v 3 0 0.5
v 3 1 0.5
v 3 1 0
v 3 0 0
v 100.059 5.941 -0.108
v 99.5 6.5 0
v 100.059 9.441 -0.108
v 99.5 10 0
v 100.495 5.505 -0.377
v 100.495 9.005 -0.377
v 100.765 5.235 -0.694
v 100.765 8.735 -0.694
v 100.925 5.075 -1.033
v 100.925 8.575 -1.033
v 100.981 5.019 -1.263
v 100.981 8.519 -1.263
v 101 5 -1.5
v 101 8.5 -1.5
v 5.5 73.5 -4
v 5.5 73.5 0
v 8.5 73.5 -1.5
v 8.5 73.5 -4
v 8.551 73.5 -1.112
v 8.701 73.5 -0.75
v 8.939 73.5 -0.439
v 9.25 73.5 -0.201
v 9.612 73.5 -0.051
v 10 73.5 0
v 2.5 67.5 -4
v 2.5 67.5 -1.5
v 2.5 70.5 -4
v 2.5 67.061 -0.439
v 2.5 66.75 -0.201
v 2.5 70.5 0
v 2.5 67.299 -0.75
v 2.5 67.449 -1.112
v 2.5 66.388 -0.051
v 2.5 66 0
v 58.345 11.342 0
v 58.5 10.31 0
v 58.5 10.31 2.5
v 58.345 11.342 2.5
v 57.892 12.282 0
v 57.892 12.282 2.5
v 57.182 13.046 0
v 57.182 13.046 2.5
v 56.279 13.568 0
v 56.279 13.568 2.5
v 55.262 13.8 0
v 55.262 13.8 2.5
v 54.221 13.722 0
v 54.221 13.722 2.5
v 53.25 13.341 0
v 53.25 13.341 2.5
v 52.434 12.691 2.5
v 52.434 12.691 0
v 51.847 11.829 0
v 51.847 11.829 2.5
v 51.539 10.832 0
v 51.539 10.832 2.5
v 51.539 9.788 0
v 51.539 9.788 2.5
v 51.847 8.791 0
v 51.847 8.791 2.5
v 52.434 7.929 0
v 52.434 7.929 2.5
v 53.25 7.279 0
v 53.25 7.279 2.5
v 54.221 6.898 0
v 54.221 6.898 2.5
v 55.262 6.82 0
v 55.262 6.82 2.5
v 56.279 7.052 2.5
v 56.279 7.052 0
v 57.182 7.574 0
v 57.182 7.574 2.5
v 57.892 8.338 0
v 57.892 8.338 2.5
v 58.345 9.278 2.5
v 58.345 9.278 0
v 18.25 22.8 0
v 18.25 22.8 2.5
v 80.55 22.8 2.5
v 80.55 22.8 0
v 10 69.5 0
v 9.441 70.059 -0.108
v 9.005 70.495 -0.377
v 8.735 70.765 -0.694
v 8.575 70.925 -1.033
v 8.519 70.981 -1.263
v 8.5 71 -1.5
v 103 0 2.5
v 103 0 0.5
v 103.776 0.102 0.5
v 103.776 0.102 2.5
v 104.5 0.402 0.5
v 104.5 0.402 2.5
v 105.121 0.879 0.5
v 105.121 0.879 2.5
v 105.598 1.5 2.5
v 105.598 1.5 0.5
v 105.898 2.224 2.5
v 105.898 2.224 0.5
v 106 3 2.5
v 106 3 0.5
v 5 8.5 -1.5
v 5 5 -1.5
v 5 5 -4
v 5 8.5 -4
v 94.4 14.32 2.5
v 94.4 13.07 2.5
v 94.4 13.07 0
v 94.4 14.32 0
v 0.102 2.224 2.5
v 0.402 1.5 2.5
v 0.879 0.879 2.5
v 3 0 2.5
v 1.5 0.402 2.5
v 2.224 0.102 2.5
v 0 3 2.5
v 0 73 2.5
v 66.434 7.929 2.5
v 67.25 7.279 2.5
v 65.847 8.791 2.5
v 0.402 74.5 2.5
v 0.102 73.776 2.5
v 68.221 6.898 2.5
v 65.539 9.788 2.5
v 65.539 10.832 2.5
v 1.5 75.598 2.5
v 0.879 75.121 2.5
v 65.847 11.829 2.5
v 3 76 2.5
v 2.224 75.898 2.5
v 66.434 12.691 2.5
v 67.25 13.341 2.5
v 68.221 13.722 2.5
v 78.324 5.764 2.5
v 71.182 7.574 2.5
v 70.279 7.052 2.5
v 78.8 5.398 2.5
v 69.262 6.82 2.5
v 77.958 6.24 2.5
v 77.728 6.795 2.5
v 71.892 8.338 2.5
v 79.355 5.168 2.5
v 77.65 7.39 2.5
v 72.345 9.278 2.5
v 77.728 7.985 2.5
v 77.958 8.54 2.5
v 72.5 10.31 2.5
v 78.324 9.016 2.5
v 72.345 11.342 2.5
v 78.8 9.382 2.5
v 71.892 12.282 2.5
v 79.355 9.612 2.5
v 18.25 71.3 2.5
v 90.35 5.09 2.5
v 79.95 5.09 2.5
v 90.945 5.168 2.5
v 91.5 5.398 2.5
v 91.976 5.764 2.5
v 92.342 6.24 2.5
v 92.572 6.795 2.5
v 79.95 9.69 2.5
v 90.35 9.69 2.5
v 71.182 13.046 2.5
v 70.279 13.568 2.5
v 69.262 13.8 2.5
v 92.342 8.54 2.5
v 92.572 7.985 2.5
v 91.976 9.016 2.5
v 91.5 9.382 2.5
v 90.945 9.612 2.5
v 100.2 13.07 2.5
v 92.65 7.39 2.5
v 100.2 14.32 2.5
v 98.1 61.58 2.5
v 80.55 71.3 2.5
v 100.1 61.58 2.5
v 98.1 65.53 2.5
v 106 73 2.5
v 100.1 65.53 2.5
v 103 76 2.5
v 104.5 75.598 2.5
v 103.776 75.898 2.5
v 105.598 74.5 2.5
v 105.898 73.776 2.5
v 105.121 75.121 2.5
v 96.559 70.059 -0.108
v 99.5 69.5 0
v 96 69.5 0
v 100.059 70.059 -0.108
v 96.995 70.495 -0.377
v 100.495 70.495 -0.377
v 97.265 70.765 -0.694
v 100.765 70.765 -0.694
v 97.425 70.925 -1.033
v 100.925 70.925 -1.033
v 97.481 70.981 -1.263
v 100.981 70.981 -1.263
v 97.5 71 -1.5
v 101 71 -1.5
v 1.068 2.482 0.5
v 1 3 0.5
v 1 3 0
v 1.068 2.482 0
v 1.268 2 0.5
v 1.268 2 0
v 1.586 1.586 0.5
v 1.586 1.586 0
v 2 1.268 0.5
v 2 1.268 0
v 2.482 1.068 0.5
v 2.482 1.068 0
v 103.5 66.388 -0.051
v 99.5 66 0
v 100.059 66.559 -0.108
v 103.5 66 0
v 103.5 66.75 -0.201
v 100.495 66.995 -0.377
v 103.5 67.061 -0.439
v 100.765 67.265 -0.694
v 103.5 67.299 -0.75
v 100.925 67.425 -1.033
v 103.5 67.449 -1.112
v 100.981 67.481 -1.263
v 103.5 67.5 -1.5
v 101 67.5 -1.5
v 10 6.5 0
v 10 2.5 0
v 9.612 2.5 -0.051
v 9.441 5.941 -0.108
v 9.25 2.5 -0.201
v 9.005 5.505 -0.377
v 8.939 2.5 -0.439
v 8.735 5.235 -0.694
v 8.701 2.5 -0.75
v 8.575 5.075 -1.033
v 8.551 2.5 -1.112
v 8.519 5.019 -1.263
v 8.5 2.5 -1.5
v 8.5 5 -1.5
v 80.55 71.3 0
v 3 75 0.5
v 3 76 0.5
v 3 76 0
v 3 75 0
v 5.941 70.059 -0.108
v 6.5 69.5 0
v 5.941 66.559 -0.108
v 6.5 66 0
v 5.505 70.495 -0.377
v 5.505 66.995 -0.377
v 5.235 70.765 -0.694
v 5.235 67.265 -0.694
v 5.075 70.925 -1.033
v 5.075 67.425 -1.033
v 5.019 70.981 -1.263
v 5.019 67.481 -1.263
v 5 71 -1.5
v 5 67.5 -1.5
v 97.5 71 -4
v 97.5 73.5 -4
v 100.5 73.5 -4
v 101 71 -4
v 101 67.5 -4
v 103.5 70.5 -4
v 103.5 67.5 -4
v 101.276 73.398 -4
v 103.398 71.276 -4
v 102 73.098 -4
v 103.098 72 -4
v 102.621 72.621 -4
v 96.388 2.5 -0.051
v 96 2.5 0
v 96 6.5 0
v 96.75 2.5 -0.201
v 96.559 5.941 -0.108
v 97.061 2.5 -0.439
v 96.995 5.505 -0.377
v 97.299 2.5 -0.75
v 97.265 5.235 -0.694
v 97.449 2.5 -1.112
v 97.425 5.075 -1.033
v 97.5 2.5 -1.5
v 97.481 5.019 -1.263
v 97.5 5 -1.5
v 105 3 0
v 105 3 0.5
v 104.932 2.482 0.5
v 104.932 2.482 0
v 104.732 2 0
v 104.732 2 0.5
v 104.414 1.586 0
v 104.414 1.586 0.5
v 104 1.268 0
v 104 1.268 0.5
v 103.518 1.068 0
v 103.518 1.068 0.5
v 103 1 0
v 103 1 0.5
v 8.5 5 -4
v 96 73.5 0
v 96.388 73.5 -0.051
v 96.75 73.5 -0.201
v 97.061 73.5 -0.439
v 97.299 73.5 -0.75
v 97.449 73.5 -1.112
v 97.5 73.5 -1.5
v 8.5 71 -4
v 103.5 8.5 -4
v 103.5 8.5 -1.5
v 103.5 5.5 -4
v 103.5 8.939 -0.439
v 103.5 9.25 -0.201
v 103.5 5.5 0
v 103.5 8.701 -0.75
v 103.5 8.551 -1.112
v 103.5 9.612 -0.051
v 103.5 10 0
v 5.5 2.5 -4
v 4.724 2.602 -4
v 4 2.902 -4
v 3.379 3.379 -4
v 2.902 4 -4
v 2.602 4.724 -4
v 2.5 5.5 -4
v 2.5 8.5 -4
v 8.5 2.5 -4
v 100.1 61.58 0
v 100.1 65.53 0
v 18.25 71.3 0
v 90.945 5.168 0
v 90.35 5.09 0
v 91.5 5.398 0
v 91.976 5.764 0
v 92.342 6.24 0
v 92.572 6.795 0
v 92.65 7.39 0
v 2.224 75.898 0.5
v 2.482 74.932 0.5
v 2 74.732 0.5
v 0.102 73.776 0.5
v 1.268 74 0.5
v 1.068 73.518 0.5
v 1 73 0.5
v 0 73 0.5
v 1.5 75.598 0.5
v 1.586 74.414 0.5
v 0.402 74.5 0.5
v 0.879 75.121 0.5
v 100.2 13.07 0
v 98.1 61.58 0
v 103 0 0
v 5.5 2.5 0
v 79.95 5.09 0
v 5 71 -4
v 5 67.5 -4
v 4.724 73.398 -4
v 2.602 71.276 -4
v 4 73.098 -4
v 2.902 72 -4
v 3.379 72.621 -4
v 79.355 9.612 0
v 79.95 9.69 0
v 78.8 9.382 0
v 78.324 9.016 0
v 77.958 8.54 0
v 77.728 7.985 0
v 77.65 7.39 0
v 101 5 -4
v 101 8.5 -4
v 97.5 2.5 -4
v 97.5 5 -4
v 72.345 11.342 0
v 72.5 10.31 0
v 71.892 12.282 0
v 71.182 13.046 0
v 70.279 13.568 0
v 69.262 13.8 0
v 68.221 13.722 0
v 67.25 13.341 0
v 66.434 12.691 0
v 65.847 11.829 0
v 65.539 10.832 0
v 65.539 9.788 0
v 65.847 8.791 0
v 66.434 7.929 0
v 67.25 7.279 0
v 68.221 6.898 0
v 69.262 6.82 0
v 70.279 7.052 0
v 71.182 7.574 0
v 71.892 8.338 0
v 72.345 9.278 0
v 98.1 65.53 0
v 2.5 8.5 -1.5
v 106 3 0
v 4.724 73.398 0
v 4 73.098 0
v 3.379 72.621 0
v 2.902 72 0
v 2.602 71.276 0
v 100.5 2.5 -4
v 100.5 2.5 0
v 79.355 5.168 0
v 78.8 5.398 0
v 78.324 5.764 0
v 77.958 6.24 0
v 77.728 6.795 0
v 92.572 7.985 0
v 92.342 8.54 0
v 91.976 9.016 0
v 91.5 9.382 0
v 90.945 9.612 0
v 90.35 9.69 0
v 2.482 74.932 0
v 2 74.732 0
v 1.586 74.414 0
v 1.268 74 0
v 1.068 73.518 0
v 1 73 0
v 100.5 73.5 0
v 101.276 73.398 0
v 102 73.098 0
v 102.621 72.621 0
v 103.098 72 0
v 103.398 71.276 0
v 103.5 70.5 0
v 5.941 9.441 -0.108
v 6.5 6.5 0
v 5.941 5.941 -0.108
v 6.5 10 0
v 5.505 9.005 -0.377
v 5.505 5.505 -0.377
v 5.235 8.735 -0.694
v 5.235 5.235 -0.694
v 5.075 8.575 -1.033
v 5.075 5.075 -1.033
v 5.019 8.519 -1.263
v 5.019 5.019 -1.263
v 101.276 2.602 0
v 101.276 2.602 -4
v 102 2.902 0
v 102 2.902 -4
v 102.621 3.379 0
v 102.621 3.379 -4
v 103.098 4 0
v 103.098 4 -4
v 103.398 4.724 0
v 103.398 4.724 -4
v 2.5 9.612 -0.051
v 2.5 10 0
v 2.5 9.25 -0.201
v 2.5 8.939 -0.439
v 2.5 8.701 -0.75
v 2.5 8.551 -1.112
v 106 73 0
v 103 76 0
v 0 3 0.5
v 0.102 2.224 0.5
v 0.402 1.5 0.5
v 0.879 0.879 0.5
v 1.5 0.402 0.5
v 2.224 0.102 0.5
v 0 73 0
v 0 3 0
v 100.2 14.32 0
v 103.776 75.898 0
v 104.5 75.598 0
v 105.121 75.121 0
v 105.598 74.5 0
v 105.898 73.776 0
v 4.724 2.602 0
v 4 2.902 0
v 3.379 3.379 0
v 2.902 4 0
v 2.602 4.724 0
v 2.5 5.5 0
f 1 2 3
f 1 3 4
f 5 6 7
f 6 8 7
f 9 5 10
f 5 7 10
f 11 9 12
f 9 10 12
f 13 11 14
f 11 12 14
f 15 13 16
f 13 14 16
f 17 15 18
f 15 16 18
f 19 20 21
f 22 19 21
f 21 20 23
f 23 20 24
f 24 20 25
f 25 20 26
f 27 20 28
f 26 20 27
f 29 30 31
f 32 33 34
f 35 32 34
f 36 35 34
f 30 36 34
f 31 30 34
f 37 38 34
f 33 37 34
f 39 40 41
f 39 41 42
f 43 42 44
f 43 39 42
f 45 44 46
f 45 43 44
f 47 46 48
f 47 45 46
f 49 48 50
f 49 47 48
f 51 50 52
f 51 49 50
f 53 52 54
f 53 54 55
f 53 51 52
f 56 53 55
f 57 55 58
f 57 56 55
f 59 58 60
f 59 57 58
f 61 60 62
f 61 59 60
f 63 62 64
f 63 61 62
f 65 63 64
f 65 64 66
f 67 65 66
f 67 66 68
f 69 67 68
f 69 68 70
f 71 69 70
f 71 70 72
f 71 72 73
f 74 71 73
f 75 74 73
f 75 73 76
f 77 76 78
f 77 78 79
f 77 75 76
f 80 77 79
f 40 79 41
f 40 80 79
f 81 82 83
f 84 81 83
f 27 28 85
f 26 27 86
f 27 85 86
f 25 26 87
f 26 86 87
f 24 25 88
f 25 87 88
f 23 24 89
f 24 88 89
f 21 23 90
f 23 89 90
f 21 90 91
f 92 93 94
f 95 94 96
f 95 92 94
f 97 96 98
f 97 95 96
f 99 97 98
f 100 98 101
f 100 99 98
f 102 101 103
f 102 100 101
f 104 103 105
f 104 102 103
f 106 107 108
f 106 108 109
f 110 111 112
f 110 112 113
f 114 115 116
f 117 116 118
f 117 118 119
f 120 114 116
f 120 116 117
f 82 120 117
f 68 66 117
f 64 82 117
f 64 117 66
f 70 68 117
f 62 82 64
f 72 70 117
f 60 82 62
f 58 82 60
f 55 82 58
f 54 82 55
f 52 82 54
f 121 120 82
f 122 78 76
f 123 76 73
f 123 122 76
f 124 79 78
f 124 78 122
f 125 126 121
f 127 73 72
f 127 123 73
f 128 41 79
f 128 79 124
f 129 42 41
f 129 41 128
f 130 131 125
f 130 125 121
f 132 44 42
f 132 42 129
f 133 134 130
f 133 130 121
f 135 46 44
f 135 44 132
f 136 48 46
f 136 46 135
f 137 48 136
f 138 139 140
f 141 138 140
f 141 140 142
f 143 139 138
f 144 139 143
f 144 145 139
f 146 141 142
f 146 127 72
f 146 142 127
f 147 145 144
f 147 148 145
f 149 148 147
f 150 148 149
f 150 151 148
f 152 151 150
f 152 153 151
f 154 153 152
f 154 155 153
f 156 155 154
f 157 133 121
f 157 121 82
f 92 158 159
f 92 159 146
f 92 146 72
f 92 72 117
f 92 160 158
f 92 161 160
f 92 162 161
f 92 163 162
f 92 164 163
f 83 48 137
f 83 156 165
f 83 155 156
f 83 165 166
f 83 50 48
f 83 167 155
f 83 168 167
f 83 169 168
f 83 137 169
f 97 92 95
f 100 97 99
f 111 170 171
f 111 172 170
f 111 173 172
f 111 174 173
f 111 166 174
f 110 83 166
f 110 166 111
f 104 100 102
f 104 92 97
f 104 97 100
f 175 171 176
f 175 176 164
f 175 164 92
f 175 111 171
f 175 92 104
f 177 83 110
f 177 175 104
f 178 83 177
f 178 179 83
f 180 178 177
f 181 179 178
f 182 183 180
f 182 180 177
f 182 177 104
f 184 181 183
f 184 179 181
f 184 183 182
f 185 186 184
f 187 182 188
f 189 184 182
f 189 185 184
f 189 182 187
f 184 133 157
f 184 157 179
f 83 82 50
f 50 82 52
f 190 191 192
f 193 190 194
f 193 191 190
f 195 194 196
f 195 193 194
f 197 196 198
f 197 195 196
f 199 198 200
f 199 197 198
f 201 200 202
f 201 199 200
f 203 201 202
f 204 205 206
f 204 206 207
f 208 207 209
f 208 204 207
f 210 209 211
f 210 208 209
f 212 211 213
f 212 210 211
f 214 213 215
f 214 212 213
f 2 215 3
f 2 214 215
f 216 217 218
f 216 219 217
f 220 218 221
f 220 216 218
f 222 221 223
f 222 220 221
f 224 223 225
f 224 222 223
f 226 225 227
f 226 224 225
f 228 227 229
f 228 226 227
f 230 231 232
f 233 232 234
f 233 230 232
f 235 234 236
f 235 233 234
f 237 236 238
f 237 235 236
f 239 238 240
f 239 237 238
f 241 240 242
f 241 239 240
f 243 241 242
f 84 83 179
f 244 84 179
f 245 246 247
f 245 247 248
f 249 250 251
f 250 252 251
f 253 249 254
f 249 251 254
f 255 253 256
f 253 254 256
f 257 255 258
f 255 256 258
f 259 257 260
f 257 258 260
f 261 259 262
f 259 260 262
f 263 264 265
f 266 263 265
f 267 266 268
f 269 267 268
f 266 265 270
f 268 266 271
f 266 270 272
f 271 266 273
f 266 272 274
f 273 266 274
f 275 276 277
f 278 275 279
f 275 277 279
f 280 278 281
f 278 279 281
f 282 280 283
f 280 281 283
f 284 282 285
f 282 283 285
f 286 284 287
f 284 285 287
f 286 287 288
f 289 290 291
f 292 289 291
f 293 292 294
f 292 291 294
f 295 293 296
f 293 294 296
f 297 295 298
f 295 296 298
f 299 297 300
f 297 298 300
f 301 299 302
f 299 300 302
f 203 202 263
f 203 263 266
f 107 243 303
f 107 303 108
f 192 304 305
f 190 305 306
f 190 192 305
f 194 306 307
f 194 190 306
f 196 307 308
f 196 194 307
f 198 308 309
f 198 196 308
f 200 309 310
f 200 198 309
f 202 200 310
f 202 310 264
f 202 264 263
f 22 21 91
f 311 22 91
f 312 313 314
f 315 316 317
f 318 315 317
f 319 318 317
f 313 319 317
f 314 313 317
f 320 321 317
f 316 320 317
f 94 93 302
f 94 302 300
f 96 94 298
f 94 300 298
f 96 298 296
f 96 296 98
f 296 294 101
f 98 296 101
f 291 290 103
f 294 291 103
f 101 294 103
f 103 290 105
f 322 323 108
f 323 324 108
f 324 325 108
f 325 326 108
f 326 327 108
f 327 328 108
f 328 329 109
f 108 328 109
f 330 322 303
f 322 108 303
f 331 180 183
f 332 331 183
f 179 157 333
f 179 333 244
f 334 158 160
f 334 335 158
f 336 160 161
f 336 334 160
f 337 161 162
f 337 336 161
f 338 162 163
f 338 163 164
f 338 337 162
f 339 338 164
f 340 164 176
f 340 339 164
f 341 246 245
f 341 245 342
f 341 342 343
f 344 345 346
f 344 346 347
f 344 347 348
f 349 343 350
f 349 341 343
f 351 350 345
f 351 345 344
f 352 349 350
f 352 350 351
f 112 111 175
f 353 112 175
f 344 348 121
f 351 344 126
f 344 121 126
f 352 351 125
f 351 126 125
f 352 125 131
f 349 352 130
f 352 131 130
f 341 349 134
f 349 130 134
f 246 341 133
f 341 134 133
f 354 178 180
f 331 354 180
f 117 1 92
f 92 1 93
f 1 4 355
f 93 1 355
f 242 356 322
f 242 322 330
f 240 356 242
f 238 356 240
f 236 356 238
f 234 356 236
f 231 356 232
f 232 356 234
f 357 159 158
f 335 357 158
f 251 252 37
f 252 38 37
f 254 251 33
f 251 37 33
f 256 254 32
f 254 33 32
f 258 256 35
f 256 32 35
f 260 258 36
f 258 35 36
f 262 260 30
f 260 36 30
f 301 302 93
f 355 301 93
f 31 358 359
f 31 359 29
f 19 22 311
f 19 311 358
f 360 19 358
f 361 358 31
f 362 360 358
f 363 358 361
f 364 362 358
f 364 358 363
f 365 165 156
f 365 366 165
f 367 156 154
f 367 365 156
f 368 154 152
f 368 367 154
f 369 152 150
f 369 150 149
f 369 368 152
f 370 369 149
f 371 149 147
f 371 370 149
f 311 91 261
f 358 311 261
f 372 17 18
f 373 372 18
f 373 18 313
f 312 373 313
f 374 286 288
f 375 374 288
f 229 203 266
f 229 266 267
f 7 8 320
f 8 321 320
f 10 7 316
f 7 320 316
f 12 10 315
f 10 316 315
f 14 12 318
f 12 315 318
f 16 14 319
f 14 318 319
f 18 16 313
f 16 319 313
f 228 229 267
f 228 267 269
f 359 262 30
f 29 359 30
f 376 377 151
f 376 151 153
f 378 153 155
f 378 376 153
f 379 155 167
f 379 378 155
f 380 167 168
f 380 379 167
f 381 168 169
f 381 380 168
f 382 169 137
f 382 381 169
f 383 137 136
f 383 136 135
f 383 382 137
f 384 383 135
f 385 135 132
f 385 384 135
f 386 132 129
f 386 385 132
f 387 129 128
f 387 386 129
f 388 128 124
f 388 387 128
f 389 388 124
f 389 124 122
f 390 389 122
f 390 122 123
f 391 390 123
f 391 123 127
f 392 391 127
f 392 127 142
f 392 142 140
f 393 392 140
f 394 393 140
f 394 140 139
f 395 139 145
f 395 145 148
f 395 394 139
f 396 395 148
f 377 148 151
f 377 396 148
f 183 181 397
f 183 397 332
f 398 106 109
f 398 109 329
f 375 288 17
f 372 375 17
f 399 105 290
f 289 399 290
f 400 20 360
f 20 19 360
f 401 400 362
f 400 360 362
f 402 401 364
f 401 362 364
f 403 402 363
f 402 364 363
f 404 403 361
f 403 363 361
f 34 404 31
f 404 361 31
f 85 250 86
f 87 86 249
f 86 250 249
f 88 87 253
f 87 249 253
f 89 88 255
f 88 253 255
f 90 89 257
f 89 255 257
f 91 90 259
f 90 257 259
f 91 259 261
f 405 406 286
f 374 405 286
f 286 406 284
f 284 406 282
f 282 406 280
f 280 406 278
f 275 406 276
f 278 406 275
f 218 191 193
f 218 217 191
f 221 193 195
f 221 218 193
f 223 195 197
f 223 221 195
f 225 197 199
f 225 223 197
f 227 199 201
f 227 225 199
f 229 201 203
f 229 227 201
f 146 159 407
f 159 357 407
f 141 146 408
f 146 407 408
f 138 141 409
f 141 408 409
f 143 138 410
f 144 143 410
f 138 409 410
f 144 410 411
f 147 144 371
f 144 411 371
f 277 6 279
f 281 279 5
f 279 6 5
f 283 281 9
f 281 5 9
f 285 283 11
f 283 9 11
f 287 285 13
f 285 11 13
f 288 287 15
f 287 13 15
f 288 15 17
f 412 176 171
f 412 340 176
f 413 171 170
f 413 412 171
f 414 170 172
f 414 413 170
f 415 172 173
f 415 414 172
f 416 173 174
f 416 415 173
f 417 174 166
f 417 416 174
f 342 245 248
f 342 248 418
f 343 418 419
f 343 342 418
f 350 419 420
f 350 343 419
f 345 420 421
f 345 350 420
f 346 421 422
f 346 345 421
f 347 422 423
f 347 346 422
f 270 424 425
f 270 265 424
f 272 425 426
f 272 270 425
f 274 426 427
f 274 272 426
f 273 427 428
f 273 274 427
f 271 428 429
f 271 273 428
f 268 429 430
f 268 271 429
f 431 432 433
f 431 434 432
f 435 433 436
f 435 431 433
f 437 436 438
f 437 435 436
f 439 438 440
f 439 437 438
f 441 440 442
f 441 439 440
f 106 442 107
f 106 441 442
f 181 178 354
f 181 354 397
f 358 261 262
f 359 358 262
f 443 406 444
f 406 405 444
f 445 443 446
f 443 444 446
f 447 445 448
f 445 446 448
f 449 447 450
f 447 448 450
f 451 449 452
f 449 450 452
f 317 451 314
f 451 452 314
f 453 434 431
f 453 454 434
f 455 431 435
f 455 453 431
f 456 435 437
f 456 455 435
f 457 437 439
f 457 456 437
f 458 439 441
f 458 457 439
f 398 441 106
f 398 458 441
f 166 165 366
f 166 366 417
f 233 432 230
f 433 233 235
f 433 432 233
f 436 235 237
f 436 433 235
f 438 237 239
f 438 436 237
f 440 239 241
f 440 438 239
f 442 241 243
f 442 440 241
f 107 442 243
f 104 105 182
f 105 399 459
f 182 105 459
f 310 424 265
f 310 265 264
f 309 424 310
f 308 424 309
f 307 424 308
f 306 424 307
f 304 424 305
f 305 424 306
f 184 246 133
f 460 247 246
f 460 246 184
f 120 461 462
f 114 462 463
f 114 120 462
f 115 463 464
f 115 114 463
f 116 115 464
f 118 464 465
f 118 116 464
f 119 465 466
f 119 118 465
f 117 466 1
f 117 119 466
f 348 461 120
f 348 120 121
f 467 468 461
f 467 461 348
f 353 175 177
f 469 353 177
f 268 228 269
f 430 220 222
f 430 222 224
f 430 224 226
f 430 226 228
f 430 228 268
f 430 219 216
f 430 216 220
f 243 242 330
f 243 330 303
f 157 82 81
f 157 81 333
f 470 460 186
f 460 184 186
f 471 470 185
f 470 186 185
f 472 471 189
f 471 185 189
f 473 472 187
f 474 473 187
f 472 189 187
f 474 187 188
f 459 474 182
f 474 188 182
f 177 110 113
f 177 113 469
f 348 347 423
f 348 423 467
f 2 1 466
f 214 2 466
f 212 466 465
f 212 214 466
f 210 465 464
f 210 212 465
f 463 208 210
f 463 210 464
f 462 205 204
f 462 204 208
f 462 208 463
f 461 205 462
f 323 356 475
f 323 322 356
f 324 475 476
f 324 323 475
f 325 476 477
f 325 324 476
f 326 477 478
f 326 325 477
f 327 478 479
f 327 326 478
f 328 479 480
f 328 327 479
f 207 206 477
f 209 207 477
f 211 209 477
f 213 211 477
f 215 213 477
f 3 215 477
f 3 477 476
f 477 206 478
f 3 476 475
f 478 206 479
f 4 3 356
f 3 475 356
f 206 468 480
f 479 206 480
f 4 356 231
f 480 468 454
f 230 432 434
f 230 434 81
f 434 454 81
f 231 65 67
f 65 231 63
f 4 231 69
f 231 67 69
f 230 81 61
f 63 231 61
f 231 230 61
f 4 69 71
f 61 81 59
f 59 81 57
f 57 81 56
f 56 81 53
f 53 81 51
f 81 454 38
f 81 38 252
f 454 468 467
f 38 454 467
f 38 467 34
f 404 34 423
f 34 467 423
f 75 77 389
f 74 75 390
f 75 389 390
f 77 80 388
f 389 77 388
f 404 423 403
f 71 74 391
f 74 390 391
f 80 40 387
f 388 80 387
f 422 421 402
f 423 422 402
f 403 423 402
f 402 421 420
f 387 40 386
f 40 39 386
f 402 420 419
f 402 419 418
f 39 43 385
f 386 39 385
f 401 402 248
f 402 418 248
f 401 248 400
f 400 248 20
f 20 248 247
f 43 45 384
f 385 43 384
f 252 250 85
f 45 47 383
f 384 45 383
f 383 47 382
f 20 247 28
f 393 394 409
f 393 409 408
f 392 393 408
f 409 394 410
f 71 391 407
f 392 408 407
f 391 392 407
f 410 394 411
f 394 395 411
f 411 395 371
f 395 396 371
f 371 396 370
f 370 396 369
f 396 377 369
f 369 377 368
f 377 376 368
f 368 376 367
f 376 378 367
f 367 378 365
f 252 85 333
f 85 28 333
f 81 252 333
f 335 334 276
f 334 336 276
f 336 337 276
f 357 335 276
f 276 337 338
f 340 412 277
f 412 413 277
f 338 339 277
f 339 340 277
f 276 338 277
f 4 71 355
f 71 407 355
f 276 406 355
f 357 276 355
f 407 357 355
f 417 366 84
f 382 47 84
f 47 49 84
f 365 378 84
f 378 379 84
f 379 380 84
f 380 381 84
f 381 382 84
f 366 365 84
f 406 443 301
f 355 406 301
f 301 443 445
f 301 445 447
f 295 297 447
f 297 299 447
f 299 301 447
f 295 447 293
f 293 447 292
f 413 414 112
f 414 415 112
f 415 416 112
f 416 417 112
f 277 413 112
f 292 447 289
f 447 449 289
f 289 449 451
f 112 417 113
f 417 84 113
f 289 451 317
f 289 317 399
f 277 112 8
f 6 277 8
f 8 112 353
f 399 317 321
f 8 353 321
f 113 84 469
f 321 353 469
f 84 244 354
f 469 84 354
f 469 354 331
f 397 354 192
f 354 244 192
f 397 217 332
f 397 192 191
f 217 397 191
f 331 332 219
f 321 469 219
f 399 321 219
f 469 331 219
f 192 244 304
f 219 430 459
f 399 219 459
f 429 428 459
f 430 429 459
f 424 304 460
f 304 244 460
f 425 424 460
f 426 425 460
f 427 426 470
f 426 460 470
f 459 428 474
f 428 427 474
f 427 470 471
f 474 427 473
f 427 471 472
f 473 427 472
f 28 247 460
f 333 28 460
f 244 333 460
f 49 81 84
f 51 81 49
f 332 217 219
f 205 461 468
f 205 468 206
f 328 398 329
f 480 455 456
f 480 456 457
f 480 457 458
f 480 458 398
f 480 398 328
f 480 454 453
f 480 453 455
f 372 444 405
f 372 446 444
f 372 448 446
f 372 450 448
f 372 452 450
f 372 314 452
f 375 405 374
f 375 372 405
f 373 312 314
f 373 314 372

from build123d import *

# Parameters (mm, degrees)
IZIM1_W                     = 106
IZIM1_H                     = 76
IZIM1_R                     = 3.5
Y_KSEKLIK_EKSTR_ZYON2_DEPTH = 2.5
IZIM5_W                     = 62.3
IZIM5_H                     = 48.5
KES_EKSTR_ZYON1_DEPTH       = 2.5
Y_KSEKLIK_EKSTR_ZYON6_DEPTH = 4
RADYUS7_R                   = 3
RADYUS15_R                  = 3
IZIM12_W                    = 15
IZIM12_H                    = 4.6
IZIM12_W_2                  = 5.8
IZIM12_H_2                  = 1.25
IZIM12_W_3                  = 2
IZIM12_H_3                  = 3.95
KES_EKSTR_ZYON3_DEPTH       = 4
RADYUS16_R                  = 2.3
KES_EKSTR_ZYON5_START       = -0.5
KES_EKSTR_ZYON5_DEPTH       = 0.5
RADYUS17_R                  = 1.5


with BuildPart() as part:
    # Çizim1 → Yükseklik-Ekstrüzyon2 (new body)
    with BuildSketch(Plane.XY):
        with Locations((53, 38)):
            Rectangle(IZIM1_W, IZIM1_H)
        with Locations((55, 10.31)):
            Circle(IZIM1_R, mode=Mode.SUBTRACT)
        with Locations((69, 10.31)):
            Circle(IZIM1_R, mode=Mode.SUBTRACT)
    extrude(amount=Y_KSEKLIK_EKSTR_ZYON2_DEPTH)

    # Çizim5 → Kes-Ekstrüzyon1 (cut)
    with BuildSketch(Plane.XY.offset(2.5)):
        with Locations((49.4, 47.05)):
            Rectangle(IZIM5_W, IZIM5_H)
    extrude(amount=-KES_EKSTR_ZYON1_DEPTH, mode=Mode.SUBTRACT)

    # Çizim7 → Yükseklik-Ekstrüzyon6 (add)
    with BuildSketch(Plane(origin=(0, 0, 0), x_dir=(-1, 0, 0), z_dir=(0, 0, -1))):
        Polygon((-103.5, 73.5), (-97.5, 73.5), (-97.5, 71), (-101, 71), (-101, 67.5), (-103.5, 67.5), align=None)
        Polygon((-2.5, 2.5), (-8.5, 2.5), (-8.5, 5), (-5, 5), (-5, 8.5), (-2.5, 8.5), align=None)
        Polygon((-2.5, 67.5), (-2.5, 73.5), (-8.5, 73.5), (-8.5, 71), (-5, 71), (-5, 67.5), align=None)
        Polygon((-103.5, 8.5), (-103.5, 2.5), (-97.5, 2.5), (-97.5, 5), (-101, 5), (-101, 8.5), align=None)
    extrude(amount=Y_KSEKLIK_EKSTR_ZYON6_DEPTH)

    # Radyus7
    radyus7_edges = [part.edges().sort_by_distance(p)[0] for p in [
        (2.5, 2.5, -2),
        (2.5, 73.5, -2),
        (103.5, 2.5, -2),
        (103.5, 73.5, -2),
    ]]
    fillet(radyus7_edges, radius=RADYUS7_R)

    # Radyus15
    radyus15_edges = [part.edges().sort_by_distance(p)[0] for p in [
        (0, 76, 1.25),
        (106, 76, 1.25),
        (106, 0, 1.25),
        (0, 0, 1.25),
    ]]
    fillet(radyus15_edges, radius=RADYUS15_R)

    # Çizim12 → Kes-Ekstrüzyon3 (cut)
    with BuildSketch(Plane.XY.offset(2.5)):
        with Locations((85.15, 7.39)):
            Rectangle(IZIM12_W, IZIM12_H)
        with Locations((97.3, 13.695)):
            Rectangle(IZIM12_W_2, IZIM12_H_2)
        with Locations((99.1, 63.555)):
            Rectangle(IZIM12_W_3, IZIM12_H_3)
    extrude(amount=-KES_EKSTR_ZYON3_DEPTH, mode=Mode.SUBTRACT)

    # Radyus16
    radyus16_edges = [part.edges().sort_by_distance(p)[0] for p in [
        (92.65, 5.09, 1.25),
        (92.65, 9.69, 1.25),
        (77.65, 9.69, 1.25),
        (77.65, 5.09, 1.25),
    ]]
    fillet(radyus16_edges, radius=RADYUS16_R - 0.0001)  # a hair under: the kernel refuses the full size

    # Çizim14 → Kes-Ekstrüzyon5 (cut)
    with BuildSketch(Plane(origin=(0, 0, 0), x_dir=(-1, 0, 0), z_dir=(0, 0, -1)).offset(KES_EKSTR_ZYON5_START)):
        with BuildLine():
            Line((-106, 3), (-105, 3))
            ThreePointArc((-105, 3), (-104.414213562, 1.585786438), (-103, 1))
            Line((-103, 1), (-103, 0))
            ThreePointArc((-103, 0), (-105.121320344, 0.878679656), (-106, 3))
        make_face()
        with BuildLine():
            Line((-3, 1), (-3, 0))
            ThreePointArc((-3, 0), (-0.878679656, 0.878679656), (0, 3))
            Line((0, 3), (-1, 3))
            ThreePointArc((-1, 3), (-1.585786438, 1.585786438), (-3, 1))
        make_face()
        with BuildLine():
            Line((-3, 76), (-3, 75))
            ThreePointArc((-3, 75), (-1.585786438, 74.414213562), (-1, 73))
            Line((-1, 73), (0, 73))
            ThreePointArc((0, 73), (-0.878679656, 75.121320344), (-3, 76))
        make_face()
    extrude(amount=KES_EKSTR_ZYON5_DEPTH, mode=Mode.SUBTRACT)

    # Radyus17
    radyus17_edges = [part.edges().sort_by_distance(p)[0] for p in [
        (3.75, 8.5, 0),
        (5, 6.75, 0),
        (6.75, 5, 0),
        (8.5, 3.75, 0),
        (3.75, 67.5, 0),
        (8.5, 72.25, 0),
        (6.75, 71, 0),
        (5, 69.25, 0),
        (102.25, 8.5, 0),
        (97.5, 3.75, 0),
        (99.25, 5, 0),
        (101, 6.75, 0),
        (102.25, 67.5, 0),
        (101, 69.25, 0),
        (99.25, 71, 0),
        (97.5, 72.25, 0),
    ]]
    fillet(radyus17_edges, radius=RADYUS17_R)


solid = part.part
